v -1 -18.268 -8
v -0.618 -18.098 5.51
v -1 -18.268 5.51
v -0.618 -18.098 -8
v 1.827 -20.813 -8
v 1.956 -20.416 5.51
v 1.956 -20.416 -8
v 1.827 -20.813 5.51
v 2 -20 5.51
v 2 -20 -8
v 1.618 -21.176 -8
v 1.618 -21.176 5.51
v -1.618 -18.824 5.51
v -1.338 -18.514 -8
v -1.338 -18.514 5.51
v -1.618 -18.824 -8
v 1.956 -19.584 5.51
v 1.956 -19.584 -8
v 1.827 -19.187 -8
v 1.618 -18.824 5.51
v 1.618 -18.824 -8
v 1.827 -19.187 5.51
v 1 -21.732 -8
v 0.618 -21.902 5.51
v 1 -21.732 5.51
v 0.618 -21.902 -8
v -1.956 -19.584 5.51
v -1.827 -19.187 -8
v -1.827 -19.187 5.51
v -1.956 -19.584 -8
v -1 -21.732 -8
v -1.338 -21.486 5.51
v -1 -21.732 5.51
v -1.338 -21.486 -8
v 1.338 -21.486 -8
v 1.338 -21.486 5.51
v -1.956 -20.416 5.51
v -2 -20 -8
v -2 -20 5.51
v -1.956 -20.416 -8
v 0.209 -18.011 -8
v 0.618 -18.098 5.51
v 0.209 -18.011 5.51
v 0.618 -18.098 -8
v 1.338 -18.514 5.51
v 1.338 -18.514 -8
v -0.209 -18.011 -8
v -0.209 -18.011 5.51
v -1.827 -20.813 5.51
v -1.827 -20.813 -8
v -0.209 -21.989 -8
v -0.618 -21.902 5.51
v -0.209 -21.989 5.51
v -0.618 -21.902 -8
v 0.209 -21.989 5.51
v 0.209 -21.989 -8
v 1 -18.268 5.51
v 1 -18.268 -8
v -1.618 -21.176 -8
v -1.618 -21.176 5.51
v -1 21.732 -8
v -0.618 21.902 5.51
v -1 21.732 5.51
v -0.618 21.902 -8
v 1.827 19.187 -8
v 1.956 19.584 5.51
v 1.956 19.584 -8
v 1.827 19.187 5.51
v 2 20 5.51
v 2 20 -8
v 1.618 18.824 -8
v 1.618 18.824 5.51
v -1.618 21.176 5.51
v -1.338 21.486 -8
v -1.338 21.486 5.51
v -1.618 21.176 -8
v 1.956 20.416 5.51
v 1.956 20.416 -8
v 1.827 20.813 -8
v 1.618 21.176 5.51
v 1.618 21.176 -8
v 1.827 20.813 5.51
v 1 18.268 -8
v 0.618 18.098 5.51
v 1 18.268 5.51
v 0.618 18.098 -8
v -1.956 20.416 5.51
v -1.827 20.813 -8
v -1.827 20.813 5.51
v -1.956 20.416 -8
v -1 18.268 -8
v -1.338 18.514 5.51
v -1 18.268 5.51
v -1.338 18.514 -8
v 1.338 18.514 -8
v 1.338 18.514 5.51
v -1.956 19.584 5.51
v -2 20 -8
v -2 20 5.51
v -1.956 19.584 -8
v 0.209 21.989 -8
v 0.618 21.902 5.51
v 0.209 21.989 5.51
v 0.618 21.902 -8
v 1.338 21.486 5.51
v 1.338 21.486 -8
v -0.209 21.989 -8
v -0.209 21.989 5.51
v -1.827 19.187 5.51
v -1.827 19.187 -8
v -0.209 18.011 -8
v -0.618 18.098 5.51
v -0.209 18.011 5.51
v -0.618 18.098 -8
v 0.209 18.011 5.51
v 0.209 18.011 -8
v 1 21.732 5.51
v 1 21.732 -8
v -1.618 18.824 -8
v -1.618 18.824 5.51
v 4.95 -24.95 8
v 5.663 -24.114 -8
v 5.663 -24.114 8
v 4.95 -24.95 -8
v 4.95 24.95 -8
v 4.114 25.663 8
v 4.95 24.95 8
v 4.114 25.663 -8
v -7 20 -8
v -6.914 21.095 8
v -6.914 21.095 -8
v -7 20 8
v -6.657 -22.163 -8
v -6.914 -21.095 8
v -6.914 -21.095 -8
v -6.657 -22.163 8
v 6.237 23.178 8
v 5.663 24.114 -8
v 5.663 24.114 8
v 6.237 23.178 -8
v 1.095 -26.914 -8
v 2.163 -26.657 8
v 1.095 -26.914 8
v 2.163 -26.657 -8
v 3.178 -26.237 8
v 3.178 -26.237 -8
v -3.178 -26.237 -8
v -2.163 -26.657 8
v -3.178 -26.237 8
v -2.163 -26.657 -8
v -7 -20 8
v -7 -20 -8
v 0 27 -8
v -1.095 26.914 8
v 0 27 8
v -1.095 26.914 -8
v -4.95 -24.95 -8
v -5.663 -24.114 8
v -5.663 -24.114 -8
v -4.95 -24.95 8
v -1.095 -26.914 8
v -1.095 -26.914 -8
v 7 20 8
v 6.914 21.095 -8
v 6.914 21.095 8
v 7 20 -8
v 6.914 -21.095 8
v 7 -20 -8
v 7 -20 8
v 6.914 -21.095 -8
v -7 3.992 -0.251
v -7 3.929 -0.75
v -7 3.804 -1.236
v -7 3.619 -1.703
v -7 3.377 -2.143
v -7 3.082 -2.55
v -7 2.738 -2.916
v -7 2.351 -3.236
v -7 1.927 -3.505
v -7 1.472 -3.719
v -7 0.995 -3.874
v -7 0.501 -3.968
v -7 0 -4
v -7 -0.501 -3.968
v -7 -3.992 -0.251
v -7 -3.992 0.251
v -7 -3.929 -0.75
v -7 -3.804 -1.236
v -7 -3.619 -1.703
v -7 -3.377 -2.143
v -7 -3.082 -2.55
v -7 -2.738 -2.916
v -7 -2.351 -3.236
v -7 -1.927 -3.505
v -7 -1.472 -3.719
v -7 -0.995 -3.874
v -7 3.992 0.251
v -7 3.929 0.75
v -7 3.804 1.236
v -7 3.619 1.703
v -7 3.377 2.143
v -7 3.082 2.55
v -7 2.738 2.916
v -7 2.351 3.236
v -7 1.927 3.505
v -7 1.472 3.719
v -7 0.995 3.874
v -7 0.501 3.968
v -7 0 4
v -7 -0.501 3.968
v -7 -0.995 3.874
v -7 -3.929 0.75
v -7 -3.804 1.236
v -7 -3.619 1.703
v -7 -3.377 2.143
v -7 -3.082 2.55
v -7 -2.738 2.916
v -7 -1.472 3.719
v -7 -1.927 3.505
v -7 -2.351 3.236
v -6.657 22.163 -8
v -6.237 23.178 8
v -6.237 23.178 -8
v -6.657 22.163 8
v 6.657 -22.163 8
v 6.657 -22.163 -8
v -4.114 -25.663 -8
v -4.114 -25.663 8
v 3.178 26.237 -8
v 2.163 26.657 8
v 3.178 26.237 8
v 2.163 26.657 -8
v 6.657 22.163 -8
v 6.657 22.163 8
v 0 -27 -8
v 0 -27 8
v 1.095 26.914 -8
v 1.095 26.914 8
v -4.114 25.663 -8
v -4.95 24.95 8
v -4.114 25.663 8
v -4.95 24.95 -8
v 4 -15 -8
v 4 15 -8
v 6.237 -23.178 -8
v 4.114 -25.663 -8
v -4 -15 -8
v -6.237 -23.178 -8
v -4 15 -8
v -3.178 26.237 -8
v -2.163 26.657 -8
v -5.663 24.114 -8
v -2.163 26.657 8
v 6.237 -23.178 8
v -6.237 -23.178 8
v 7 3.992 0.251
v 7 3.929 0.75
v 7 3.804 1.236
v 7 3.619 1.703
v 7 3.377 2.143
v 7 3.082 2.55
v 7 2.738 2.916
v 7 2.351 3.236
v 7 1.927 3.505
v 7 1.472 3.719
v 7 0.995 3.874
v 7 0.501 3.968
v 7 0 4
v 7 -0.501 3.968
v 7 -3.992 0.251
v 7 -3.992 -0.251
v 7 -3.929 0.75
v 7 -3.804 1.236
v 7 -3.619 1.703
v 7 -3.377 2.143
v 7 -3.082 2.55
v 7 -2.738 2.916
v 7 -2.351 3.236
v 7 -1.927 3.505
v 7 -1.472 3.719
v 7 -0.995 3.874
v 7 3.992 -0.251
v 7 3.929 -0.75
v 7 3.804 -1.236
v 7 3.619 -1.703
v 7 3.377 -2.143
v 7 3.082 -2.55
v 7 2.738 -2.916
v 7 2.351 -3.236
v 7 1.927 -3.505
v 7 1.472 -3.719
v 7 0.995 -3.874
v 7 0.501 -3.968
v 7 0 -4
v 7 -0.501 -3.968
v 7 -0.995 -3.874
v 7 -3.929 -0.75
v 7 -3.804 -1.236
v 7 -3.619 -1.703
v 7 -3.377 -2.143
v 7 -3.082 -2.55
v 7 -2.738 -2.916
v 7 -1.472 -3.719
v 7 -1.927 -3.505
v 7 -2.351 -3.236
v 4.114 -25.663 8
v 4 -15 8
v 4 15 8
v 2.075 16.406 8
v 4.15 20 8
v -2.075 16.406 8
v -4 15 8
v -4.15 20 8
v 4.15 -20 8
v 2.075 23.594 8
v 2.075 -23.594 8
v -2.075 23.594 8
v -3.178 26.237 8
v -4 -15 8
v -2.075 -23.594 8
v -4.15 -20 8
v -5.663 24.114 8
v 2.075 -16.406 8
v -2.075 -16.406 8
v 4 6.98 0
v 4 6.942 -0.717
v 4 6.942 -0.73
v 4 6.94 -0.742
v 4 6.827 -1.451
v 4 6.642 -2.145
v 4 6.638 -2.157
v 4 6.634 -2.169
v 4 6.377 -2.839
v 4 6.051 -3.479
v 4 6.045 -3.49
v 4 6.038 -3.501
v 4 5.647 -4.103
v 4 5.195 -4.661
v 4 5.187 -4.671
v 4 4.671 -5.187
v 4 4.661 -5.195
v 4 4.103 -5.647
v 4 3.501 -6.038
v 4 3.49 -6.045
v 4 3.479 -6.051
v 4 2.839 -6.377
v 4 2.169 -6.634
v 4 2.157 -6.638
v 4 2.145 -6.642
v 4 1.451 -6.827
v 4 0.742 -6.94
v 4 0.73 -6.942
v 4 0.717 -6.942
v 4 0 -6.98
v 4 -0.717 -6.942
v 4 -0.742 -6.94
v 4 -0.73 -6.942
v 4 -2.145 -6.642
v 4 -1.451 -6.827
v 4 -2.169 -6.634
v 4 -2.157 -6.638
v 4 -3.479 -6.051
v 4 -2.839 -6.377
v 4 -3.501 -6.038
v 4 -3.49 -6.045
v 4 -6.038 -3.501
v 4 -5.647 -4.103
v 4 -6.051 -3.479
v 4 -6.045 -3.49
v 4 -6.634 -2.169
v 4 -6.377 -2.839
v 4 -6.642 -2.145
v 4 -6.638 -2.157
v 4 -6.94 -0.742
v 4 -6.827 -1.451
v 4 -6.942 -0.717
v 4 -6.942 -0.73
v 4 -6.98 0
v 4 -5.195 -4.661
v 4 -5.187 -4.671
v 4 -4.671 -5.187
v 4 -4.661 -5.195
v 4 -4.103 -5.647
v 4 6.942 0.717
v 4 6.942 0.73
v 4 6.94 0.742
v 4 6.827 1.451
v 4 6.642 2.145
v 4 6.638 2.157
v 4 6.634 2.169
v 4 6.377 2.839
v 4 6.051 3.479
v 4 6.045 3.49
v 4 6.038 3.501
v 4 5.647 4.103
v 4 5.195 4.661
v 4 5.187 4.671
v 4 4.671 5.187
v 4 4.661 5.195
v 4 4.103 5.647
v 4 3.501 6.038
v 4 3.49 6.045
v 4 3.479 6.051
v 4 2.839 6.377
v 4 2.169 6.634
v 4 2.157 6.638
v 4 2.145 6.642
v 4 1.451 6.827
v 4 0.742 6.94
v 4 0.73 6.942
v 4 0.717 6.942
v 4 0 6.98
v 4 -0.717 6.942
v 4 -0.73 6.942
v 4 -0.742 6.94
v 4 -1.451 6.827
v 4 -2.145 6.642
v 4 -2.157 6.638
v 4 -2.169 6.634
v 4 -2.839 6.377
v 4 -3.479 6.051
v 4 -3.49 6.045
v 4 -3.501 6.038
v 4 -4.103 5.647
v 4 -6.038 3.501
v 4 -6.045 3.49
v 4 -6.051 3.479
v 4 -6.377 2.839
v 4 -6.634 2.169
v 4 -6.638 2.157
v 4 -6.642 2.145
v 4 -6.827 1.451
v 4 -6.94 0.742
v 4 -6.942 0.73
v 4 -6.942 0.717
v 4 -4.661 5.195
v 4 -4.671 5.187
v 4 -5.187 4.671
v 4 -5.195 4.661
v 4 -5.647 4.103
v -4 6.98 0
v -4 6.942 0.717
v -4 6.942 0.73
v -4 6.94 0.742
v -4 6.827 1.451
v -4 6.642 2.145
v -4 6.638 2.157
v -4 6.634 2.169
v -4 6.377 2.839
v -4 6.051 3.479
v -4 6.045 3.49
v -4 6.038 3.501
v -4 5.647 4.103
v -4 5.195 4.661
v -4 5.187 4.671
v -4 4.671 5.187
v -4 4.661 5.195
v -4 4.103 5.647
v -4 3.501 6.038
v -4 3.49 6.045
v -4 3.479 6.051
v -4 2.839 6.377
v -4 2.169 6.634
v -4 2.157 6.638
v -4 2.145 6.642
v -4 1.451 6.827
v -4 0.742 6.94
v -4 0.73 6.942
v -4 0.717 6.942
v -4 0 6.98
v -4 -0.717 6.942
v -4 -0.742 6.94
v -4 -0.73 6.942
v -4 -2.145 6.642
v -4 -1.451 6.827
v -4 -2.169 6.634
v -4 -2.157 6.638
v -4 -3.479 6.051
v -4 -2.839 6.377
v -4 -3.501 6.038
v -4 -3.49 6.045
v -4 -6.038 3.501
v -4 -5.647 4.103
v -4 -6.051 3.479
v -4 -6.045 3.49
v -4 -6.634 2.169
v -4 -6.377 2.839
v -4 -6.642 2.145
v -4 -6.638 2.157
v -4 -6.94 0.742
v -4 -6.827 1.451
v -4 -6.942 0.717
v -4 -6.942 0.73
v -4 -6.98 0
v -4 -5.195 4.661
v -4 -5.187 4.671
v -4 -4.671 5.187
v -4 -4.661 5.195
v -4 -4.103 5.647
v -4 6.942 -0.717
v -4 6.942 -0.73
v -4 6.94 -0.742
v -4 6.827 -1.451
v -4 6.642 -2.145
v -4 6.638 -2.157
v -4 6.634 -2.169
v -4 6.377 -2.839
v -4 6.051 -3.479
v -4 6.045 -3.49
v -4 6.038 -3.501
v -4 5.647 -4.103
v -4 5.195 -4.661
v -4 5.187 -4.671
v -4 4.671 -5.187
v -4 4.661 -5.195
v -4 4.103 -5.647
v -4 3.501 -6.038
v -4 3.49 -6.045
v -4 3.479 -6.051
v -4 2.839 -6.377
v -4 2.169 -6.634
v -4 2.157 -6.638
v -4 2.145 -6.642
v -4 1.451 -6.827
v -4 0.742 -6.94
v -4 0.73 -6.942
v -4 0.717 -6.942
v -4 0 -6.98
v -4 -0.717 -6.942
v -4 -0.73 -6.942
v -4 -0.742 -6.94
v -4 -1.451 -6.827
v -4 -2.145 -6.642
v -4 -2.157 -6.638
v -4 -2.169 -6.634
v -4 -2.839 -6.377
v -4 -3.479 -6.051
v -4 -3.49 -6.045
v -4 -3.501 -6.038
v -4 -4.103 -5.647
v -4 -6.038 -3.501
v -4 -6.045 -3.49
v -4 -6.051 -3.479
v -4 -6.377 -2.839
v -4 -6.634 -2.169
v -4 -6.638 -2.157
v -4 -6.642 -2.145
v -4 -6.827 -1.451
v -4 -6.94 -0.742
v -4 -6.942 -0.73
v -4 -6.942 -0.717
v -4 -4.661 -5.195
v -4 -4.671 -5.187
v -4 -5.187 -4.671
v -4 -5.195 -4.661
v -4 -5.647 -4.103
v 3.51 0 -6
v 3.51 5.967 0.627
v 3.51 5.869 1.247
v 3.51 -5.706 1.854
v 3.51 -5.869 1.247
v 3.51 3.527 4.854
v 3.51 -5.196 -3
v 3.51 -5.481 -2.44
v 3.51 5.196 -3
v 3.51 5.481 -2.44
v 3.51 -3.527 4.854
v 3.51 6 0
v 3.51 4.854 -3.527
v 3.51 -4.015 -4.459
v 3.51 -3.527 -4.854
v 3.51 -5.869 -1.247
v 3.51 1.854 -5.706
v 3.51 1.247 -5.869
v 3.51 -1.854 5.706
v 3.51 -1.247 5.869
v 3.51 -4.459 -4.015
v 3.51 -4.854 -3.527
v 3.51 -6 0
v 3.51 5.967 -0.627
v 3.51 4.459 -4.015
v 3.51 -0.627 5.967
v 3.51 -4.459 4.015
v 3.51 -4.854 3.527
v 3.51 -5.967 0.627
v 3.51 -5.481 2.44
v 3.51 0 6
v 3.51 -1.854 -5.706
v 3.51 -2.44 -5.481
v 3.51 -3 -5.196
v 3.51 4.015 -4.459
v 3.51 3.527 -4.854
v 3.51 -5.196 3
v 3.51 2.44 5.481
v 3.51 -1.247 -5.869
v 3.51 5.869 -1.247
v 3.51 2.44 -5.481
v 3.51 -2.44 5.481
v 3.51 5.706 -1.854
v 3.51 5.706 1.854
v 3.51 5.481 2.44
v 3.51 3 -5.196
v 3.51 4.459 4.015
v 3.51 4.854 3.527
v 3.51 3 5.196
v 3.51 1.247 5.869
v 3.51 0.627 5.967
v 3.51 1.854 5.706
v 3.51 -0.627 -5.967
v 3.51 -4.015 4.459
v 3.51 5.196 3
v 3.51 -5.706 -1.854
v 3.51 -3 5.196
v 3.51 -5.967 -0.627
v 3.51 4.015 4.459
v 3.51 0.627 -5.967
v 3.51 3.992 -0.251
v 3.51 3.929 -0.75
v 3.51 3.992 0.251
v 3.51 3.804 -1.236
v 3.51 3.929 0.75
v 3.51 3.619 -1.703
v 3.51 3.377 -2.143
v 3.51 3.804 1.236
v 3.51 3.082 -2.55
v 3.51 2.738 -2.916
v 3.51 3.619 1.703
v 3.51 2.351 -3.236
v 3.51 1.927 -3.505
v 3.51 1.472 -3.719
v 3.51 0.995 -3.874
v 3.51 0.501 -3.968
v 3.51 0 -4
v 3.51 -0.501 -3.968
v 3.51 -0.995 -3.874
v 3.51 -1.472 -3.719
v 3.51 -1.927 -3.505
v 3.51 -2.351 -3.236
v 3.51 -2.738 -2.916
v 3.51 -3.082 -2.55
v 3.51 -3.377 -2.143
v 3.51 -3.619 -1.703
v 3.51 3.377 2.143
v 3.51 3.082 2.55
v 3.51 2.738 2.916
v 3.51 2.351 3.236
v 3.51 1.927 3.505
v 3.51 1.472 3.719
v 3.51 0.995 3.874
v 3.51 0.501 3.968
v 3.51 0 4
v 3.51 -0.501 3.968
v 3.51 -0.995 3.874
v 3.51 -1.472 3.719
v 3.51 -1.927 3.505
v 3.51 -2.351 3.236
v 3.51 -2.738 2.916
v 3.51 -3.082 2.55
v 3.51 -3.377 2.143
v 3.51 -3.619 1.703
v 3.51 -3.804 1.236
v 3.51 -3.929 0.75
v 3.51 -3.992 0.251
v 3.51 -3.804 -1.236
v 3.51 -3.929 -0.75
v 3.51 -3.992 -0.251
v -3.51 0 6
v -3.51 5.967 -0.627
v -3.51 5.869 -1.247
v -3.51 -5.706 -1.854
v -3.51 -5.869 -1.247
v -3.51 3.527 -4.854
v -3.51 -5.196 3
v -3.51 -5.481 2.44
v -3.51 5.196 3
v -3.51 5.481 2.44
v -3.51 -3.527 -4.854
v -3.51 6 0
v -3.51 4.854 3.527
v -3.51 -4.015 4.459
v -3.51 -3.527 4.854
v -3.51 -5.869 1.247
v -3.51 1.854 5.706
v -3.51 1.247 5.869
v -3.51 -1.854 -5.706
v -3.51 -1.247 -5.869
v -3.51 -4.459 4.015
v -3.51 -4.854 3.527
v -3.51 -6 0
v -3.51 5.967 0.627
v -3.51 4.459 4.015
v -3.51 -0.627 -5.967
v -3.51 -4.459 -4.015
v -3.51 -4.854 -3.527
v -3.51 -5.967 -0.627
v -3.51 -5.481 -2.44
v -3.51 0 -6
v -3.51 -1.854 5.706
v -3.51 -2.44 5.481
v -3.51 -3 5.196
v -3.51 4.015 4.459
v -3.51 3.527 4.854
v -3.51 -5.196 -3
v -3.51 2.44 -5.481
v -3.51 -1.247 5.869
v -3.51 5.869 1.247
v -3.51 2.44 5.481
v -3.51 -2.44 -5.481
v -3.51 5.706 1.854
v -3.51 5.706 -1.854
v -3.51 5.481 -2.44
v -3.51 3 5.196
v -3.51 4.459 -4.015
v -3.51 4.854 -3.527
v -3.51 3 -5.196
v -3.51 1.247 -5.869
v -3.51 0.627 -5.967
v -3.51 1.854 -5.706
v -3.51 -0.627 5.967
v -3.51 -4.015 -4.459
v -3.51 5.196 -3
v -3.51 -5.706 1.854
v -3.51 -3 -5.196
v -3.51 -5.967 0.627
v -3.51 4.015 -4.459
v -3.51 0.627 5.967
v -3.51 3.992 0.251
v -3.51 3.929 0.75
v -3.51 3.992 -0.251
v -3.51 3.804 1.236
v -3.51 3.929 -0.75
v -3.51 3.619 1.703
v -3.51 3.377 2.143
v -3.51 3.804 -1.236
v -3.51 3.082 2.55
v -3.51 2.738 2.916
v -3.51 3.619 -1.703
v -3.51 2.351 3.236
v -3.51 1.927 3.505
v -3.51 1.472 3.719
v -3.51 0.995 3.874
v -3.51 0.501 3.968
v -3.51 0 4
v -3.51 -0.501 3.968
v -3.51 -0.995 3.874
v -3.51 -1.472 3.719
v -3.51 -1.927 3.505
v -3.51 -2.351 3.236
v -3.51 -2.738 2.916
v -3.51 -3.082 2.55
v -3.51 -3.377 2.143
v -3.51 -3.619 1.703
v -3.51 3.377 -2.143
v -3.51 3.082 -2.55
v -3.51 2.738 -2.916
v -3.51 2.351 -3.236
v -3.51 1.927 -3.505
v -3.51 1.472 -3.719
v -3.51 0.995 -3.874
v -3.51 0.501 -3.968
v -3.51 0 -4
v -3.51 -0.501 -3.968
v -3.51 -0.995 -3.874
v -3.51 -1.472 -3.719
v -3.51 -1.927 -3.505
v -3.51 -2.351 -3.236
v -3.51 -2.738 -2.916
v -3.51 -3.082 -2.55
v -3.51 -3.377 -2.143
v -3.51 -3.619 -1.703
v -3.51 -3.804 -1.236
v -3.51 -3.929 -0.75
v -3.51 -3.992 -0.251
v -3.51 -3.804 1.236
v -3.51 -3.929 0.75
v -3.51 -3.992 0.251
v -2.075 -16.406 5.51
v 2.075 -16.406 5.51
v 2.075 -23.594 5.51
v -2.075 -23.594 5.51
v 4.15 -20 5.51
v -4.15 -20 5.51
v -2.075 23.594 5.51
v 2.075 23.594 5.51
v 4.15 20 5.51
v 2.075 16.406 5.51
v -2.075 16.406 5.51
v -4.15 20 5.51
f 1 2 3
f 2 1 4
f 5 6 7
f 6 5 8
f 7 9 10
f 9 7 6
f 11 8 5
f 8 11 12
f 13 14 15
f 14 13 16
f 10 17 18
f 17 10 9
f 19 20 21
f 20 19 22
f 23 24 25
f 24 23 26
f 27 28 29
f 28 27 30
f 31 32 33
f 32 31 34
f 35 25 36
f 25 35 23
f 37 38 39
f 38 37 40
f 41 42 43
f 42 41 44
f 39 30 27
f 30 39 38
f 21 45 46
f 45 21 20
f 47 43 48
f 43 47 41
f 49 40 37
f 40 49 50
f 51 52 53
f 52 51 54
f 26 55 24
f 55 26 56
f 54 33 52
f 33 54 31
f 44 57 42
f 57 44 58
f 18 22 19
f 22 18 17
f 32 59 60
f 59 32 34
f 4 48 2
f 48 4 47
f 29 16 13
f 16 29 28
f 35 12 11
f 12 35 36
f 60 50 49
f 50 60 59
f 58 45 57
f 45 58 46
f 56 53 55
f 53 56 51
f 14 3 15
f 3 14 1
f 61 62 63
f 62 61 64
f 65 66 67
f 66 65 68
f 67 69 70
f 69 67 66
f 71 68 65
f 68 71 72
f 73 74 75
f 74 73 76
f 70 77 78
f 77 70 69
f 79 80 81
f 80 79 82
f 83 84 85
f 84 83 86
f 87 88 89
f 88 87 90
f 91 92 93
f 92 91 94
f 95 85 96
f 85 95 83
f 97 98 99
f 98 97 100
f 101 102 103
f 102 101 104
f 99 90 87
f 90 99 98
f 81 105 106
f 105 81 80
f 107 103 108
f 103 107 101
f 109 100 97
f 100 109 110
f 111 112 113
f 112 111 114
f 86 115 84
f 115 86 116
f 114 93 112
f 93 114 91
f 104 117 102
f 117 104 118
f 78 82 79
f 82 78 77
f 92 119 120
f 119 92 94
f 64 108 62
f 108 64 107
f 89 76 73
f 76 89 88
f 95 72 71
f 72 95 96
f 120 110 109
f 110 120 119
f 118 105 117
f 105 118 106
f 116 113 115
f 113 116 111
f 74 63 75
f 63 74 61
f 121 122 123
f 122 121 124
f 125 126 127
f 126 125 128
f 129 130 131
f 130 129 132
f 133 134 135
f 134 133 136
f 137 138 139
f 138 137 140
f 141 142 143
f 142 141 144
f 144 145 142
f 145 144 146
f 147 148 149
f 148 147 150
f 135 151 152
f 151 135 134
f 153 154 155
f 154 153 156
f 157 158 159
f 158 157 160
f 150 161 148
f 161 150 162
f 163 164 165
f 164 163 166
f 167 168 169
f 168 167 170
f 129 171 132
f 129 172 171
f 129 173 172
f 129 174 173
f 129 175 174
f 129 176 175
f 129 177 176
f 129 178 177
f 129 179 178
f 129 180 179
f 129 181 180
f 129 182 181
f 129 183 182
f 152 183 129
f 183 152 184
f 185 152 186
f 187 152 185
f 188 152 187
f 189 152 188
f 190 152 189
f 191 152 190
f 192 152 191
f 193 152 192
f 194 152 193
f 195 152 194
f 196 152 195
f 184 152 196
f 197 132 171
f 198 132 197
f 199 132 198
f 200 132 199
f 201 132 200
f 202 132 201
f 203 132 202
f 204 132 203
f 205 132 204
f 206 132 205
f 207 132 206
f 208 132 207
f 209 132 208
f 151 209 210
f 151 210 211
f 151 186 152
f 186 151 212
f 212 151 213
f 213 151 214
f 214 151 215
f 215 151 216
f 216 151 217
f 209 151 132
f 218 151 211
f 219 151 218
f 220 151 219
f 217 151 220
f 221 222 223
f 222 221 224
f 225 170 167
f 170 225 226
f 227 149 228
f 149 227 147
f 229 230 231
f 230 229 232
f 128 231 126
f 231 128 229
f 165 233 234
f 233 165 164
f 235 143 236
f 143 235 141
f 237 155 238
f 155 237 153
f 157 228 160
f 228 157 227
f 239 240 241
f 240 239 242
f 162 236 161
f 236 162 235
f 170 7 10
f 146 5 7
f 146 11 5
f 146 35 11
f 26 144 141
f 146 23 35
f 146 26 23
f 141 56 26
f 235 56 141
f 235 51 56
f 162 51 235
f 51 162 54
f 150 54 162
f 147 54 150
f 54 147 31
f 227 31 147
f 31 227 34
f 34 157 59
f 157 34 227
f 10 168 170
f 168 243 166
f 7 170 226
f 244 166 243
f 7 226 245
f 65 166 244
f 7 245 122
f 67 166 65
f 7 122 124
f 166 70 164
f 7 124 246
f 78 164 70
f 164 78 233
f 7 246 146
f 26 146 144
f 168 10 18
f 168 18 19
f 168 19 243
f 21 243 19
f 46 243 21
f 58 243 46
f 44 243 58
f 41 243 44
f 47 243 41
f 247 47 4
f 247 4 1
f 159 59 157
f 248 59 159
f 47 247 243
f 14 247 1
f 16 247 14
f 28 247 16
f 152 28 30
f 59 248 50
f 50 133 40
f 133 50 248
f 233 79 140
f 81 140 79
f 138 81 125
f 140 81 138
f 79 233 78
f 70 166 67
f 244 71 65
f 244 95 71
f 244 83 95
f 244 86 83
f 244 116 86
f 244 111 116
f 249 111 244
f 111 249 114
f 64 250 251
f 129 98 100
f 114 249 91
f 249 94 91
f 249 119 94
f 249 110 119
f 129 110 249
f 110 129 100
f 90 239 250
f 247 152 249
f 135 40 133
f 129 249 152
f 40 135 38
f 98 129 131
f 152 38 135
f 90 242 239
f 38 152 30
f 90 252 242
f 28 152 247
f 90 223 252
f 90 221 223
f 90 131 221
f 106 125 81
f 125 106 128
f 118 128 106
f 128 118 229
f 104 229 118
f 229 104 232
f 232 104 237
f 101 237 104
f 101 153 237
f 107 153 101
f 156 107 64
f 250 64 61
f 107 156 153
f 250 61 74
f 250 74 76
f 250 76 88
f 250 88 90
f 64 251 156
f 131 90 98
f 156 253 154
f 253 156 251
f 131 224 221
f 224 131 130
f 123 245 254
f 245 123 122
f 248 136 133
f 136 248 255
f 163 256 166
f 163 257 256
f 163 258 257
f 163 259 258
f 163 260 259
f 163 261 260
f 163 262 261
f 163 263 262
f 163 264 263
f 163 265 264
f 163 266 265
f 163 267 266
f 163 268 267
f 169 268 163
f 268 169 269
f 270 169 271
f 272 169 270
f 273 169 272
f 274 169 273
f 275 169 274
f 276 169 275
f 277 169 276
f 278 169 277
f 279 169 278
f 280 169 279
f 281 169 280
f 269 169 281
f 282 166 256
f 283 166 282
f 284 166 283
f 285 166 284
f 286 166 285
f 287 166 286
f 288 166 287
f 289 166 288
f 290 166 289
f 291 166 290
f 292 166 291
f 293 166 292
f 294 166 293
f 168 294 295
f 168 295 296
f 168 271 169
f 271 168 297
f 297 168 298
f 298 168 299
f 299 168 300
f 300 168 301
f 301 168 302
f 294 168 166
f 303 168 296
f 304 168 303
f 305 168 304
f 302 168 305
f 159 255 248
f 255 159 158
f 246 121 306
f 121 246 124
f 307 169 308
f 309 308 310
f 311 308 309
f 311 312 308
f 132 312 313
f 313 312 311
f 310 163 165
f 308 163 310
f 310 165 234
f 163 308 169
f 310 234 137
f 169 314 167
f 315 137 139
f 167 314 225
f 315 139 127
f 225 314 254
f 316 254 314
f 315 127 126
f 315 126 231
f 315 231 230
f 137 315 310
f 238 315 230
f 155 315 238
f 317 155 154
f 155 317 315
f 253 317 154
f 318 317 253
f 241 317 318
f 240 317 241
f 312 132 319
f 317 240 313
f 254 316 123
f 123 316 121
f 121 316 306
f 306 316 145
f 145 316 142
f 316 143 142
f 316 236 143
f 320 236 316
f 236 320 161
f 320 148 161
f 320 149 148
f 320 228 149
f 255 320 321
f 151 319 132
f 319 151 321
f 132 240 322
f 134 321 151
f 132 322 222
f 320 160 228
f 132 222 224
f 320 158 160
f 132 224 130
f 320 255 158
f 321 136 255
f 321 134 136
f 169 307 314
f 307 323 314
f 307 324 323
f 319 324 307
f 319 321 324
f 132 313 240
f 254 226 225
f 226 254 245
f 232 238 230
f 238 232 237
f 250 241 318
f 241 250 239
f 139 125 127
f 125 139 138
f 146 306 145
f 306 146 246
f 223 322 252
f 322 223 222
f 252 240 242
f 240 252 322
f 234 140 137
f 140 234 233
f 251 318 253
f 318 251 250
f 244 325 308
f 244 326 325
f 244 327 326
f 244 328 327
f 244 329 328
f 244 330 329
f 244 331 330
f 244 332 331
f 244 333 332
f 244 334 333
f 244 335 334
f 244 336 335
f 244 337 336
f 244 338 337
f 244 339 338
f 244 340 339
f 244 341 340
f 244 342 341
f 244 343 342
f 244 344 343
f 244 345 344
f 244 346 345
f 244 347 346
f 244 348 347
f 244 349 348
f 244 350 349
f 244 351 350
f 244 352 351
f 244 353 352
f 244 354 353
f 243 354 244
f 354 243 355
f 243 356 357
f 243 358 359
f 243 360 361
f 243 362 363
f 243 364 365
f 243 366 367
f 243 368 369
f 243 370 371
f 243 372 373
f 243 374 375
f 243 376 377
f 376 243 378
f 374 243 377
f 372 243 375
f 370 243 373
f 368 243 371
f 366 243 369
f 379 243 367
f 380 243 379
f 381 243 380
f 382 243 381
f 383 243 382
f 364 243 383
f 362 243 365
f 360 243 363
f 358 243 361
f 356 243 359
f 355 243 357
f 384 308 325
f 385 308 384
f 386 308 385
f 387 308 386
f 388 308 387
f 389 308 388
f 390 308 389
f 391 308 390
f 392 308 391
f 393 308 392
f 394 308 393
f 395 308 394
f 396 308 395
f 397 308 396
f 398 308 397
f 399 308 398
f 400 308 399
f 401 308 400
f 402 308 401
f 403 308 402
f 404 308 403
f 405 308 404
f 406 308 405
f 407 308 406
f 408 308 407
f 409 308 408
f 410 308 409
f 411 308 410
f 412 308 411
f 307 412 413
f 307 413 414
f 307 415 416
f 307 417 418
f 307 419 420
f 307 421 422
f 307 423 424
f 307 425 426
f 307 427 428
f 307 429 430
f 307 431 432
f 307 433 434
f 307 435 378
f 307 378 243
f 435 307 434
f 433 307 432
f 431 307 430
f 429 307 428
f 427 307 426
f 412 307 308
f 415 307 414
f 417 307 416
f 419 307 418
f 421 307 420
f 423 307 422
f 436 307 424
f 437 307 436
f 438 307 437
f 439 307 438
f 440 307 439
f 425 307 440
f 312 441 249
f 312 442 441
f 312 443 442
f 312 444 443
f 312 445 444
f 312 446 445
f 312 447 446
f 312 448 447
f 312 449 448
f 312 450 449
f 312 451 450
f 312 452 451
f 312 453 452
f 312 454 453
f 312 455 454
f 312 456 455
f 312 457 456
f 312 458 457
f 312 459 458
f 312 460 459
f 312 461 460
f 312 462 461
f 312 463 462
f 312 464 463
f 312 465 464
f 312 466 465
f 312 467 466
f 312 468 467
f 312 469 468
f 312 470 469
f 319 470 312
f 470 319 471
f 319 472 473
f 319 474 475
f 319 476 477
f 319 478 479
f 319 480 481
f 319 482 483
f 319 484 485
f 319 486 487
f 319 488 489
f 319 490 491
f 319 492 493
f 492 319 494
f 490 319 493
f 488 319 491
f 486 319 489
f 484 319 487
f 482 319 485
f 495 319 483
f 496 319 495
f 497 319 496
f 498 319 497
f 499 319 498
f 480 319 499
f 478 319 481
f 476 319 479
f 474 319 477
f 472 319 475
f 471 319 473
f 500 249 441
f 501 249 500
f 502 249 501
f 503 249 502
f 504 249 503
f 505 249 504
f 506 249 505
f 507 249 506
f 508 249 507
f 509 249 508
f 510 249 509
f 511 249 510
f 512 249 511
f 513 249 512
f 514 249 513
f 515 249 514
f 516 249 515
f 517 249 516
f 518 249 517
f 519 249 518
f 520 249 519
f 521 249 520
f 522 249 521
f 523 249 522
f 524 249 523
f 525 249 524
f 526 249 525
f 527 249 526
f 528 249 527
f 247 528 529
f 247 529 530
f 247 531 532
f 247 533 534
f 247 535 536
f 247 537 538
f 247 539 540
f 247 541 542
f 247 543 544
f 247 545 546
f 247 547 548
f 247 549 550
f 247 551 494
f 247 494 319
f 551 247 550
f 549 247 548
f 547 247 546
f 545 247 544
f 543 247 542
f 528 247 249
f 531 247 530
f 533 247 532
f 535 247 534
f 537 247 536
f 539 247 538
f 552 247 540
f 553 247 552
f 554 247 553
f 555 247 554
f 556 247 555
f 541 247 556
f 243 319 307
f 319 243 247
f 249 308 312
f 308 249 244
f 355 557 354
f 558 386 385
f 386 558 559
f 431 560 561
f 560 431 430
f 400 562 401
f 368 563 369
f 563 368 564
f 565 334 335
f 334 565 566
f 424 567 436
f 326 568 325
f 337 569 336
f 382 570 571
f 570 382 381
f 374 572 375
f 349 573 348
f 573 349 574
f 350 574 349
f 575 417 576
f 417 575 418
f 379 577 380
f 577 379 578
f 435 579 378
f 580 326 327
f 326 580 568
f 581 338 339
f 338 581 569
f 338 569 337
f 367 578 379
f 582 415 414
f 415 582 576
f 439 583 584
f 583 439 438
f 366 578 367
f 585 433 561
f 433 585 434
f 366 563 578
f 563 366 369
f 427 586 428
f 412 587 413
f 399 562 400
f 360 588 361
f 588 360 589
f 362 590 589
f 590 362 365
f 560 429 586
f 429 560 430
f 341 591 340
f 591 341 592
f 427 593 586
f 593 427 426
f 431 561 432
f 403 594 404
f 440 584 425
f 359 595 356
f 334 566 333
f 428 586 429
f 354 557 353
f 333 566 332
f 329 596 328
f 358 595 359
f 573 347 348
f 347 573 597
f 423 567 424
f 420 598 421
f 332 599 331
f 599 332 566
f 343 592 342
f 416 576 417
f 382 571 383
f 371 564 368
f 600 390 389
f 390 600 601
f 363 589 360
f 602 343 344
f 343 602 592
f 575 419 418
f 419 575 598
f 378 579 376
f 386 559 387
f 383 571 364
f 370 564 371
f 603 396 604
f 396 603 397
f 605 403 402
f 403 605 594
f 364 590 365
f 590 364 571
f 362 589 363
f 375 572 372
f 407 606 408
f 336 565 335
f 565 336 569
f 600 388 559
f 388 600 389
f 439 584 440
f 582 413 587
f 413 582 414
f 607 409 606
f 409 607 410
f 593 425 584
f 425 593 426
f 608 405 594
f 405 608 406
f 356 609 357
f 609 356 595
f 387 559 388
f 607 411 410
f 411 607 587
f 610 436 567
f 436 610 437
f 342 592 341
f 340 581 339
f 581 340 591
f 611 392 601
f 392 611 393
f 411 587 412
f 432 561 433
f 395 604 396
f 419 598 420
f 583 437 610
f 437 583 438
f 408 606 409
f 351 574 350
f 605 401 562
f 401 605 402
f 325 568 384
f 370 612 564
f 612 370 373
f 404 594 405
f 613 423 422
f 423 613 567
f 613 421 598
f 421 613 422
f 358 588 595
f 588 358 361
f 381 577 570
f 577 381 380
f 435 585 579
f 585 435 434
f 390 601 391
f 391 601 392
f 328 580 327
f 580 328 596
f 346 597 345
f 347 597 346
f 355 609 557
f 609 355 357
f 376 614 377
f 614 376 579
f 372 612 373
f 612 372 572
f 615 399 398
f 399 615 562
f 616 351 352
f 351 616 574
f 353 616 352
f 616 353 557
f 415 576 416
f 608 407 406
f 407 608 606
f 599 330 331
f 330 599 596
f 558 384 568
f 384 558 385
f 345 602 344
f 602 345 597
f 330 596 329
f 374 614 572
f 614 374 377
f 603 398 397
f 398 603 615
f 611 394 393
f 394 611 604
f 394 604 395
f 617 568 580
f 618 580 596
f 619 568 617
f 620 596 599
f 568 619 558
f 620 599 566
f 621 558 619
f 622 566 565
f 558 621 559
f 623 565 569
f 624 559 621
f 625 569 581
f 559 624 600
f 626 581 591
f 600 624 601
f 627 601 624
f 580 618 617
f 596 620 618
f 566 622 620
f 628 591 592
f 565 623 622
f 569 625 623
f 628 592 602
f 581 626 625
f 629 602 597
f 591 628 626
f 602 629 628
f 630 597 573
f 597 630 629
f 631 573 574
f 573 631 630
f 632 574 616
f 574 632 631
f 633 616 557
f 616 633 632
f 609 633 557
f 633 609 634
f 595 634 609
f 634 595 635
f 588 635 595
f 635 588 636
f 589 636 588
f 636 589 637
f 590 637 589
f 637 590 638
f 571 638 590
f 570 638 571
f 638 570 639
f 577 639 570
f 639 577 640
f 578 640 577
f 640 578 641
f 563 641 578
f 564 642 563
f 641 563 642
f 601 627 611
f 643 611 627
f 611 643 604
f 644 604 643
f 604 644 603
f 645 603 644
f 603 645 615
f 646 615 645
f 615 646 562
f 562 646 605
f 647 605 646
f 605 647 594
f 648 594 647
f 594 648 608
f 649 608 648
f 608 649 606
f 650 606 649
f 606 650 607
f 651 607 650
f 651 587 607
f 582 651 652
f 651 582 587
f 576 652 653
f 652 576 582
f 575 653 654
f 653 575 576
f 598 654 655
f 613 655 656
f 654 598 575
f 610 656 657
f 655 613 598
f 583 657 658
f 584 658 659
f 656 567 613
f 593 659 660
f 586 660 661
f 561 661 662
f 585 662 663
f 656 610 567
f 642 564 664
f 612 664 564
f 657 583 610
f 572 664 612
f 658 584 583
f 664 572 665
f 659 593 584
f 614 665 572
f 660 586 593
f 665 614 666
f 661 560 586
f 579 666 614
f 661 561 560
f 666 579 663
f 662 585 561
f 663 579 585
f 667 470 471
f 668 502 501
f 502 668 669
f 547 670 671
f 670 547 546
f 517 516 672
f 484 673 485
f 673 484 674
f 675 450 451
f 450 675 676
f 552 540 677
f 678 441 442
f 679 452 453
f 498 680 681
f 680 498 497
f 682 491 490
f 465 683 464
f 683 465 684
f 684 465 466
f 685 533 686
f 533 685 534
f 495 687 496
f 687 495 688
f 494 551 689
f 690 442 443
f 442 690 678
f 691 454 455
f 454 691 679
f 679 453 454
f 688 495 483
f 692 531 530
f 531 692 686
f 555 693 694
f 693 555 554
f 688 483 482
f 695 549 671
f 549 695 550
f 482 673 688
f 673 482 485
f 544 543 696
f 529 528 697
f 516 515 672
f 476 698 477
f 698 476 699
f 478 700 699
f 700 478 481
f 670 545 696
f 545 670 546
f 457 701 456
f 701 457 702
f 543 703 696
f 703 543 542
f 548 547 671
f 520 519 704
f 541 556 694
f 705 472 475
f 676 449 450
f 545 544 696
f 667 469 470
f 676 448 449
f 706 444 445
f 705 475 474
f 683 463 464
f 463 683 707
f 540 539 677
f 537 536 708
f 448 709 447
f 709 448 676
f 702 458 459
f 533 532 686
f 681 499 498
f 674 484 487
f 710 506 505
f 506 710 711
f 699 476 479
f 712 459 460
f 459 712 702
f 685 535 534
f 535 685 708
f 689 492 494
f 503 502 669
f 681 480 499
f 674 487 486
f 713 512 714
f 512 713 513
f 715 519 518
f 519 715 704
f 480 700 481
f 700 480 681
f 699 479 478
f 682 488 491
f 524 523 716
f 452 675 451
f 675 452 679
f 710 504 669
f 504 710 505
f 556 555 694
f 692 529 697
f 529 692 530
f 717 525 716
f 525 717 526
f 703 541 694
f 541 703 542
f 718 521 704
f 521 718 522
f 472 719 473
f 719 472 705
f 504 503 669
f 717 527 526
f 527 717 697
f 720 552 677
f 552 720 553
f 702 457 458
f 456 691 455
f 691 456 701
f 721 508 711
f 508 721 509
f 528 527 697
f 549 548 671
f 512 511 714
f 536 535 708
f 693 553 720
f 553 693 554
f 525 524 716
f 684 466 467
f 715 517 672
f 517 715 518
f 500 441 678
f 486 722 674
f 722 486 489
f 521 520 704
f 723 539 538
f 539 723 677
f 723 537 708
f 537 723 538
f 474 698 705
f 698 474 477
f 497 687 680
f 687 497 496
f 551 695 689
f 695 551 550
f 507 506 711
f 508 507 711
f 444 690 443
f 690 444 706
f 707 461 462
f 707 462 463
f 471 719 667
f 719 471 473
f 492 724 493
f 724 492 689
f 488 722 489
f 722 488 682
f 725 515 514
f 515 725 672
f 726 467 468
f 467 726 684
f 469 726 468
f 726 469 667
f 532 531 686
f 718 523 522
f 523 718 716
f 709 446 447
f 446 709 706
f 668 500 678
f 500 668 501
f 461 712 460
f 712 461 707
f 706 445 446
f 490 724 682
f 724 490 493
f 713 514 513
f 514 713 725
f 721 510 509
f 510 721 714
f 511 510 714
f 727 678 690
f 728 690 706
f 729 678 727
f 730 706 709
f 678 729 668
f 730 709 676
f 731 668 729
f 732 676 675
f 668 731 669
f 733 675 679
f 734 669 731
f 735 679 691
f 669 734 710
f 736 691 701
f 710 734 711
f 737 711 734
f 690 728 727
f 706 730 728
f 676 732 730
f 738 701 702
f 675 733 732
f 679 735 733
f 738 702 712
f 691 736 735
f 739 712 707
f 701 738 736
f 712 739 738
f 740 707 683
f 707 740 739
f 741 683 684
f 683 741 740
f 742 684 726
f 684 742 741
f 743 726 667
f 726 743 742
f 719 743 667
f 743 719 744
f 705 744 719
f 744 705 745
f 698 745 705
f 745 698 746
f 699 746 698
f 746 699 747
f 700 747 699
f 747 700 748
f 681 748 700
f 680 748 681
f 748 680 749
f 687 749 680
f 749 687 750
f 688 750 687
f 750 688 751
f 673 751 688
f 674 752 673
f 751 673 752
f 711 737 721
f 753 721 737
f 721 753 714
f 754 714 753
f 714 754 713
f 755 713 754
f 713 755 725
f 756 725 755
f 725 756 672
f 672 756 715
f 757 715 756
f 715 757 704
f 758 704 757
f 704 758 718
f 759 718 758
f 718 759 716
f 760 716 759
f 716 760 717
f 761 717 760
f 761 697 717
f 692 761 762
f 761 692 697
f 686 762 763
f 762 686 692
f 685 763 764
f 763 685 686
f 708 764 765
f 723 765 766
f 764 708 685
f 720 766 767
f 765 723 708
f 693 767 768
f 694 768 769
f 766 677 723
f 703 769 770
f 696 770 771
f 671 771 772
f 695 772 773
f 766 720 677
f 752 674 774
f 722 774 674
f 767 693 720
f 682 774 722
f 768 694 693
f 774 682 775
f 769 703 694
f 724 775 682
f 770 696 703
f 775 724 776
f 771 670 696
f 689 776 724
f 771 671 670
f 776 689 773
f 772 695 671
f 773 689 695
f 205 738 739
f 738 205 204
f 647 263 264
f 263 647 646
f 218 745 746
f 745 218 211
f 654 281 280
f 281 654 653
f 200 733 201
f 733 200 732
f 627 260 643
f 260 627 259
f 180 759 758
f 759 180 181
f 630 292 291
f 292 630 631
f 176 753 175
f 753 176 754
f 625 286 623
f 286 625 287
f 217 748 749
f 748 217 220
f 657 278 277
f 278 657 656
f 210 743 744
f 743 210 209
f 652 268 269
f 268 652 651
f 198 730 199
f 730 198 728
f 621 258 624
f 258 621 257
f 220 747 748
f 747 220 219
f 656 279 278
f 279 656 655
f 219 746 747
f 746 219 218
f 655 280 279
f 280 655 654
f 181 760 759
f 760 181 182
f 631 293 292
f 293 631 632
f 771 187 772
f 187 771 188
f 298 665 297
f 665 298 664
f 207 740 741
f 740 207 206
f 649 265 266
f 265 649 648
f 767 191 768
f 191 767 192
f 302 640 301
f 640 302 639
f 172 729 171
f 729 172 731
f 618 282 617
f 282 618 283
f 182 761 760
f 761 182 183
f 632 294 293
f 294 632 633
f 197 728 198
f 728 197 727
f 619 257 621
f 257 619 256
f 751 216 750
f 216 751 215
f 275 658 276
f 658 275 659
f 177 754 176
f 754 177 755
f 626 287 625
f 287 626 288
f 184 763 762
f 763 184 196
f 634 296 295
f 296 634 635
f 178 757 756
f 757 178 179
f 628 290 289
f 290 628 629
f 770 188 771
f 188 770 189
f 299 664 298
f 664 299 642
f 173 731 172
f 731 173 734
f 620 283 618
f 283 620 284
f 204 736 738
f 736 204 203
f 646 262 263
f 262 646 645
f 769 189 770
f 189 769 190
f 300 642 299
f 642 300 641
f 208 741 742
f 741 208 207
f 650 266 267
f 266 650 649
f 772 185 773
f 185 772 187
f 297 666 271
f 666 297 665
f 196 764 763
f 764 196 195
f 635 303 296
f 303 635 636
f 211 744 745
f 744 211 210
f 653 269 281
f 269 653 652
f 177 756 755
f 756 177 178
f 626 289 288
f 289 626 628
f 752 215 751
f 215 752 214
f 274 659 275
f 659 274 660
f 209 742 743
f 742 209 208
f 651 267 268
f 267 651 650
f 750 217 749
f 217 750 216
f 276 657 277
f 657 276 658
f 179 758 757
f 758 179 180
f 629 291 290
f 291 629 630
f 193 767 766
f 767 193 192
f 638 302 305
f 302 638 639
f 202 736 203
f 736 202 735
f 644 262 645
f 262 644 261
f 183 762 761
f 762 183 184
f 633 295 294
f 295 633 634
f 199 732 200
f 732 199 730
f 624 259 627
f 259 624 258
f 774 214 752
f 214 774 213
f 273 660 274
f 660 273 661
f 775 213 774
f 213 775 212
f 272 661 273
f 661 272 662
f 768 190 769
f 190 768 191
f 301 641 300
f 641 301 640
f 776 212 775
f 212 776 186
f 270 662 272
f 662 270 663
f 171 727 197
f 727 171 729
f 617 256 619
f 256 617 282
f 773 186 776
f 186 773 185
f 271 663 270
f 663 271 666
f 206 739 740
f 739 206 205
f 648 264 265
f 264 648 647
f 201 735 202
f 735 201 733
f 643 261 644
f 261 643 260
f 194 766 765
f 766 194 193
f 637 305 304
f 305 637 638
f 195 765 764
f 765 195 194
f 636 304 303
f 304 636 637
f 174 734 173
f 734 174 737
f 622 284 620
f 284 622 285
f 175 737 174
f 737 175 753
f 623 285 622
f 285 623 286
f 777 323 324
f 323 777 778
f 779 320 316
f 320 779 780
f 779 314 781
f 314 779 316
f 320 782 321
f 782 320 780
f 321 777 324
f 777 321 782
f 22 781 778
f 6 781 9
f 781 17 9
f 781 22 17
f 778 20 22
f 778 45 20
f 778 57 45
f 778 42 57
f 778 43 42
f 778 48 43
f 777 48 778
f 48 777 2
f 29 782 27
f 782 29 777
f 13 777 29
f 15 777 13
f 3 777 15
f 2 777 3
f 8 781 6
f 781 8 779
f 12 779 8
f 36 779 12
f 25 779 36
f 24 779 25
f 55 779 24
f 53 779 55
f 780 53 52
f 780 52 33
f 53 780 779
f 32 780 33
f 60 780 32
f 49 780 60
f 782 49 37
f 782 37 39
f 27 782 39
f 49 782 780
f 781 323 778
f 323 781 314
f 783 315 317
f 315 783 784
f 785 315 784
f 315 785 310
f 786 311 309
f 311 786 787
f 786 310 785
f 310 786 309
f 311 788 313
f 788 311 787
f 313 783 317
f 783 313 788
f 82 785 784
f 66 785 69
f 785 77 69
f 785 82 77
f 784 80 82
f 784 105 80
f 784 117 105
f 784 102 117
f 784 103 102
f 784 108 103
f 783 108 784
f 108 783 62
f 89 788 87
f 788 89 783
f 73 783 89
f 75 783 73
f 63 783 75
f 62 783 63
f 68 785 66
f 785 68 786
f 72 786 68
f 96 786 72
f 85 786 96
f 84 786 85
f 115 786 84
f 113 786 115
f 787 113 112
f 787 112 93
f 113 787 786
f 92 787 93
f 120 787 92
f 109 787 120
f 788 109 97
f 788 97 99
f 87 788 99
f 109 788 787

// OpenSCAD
// file: configuration.scad
// OD = outside diameter, corner to corner.
m3_nut_od = 6.1;
m3_nut_radius = (m3_nut_od+0.2)/2;

m4_nut_od = 8.1;
m4_nut_radius = (m4_nut_od+0.2)/2;

// Major diameter of metric 3mm thread.
m3_major = 2.85;
m3_radius = m3_major/2;
m3_open_radius = 3.2/2;

m4_major = 3.85;
m4_radius = m4_major/2;
m4_open_radius = 4.3/2;

m8_major = 7.85;
m8_radius = m8_major/2;
m8_open_radius = 8.3/2;

// NEMA17 stepper motors.
motor_shaft_diameter = 5;
motor_shaft_radius = (motor_shaft_diameter+0.3)/2;

// Frame brackets.
thickness = 3.6;

tower_radius = 185;
tower_side = tower_radius*1.73205;
tower_h = tower_radius*1.5;
tower_height = 1000;
bearing_spacing = 39.8;
horizontal_beam_radius = (tower_radius+28.8)/2;
horizontal_beam_length = horizontal_beam_radius * 3.464101615138 - (41.35*2);

color_a = "GreenYellow";
color_b = "black";
color_c = "";
color_d = "Silver";
// file: ../components/bearing_608.scad
module bearing_608(){
	color("LightGrey") difference(){
		hull(){
			cylinder(6,11,11,$fn=80,center=true);
			cylinder(7,10.5,10.5,$fn=80,center=true);
		}
		translate([0,0,-0.5]) cylinder(10,9,9,$fn=80,center=true);
	}
	color("LightGrey") 
		difference(){
			cylinder(7,6,6,$fn=80,center=true);
			cylinder(10,4,4,$fn=80,center=true);
		}
	color("DarkGray") 
		difference(){
			cylinder(6.6,10.6,10.6,$fn=80,center=true);
			cylinder(10,5,5,$fn=80,center=true);
		}
}
// file: ../components/M4x60_hex.scad
module m4x60_hex(){
	color("LightGrey") 
		difference(){
			cylinder(4,3.5,3.5,$fn=40);
			translate([0,0,1.1])cylinder(3,1.6,1.6,$fn=6);
		}
	color("LightGrey") translate([0,0,-40]) cylinder(40,2,2,$fn=30);
	color("Gray") translate([0,0,-60]) cylinder(20,1.9,1.9,$fn=30);
}
// file: ../components/2020.scad
module outer_shape(h=10){
	hull(){
		translate([8.6,8.6,-h/2]) cylinder(r=1.4,h=h,$fn=30);
		translate([8.6,-8.6,-h/2]) cylinder(r=1.4,h=h,$fn=30);
		translate([-8.6,8.6,-h/2]) cylinder(r=1.4,h=h,$fn=30);
		translate([-8.6,-8.6,-h/2]) cylinder(r=1.4,h=h,$fn=30);
	}
}

module extrusion(h=10){
	difference(){
		union(){
			difference(){
				outer_shape(h=h);
				cube([17.2,17.2,h+0.1],center=true);
				cube([20.1,6,h+0.1],center=true);
				cube([6,20.1,h+0.1],center=true);

				translate([-9.9,0,0])cube([0.5,6.8,h+0.1],center=true);
				translate([9.9,0,0])cube([0.5,6.8,h+0.1],center=true);
				translate([0,-9.9,0])cube([6.8,0.5,h+0.1],center=true);
				translate([0,9.9,0])cube([6.8,0.5,h+0.1],center=true);
			}
			rotate([0,0,45]) cube([26,1.5,h],center=true);
			rotate([0,0,-45]) cube([26,1.5,h],center=true);
			intersection(){
				union(){
					translate([8,8,0]) cube([4,4,h],center=true);
					translate([8,-8,0]) cube([4,4,h],center=true);
					translate([-8,8,0]) cube([4,4,h],center=true);
					translate([-8,-8,0]) cube([4,4,h],center=true);
				}
				outer_shape();
			}
			cube([9,9,h],center=true);
		}
		translate([0,0,-h/2-1]) cylinder(h+2,2.5,2.5,$fn=30);
	}


}

module beam(h=10,clearance = 0){
	if(clearance > 0){
		outer_shape(h=h);
	} else {
		extrusion(h);
	}
}
// main file
include <../components/2020.scad>
include <../components/M4x60_hex.scad>
include <../components/bearing_608.scad>
include <configuration.scad>

screw_spacing = 40;
bearing_holder_height = 16;
bearing_holder_width = 30;
bearing_holder_depth = 8;

module tensioner_mount(){
	difference(){
		hull(){
			translate([0,0,2])cube([bearing_holder_depth+6,screw_spacing,24],center=true);
			translate([0,(screw_spacing/2),-10]) cylinder(r=7,h=24,$fn=40);
			translate([0,-(screw_spacing/2),-10]) cylinder(r=7,h=24,$fn=40);
		}
		// Screw Cutouts
		translate([0,(screw_spacing/2),14.01]) m4x60_hex();
		translate([0,-(screw_spacing/2),14.01]) m4x60_hex();

		translate([0,0,14.01]) cylinder(r=m4_open_radius,h=100,$fn=50, center=true);

		// Beam Cutout
		rotate([0,90,0]) beam(h=100,clearance=1);
		translate([0,0,-2]) rotate([0,90,0]) beam(h=100,clearance=1);
	}
}

module tensioner_bearing(){
	difference(){
		union(){
			difference(){
				hull(){
					cube([bearing_holder_depth+6,screw_spacing,bearing_holder_height],center=true);
					translate([0,(screw_spacing/2),0]) cylinder(r=7,h=bearing_holder_height,$fn=40,center=true);
					translate([0,-(screw_spacing/2),0]) cylinder(r=7,h=bearing_holder_height,$fn=40,center=true);
				}
				// Screw Cutouts
				translate([0,(screw_spacing/2),14.01]) m4x60_hex();
				translate([0,-(screw_spacing/2),14.01]) m4x60_hex();

				// B	earing Cutout
				translate([0,0,0])cube([bearing_holder_depth,bearing_holder_width,30],center=true);
			}
			translate([(bearing_holder_depth/2+0.01),0,0]) rotate([0,-90,0]) cylinder(0.5,7,6,$fn=60);
			translate([-(bearing_holder_depth/2+0.01),0,0]) rotate([0,90,0]) cylinder(0.5,7,6,$fn=60);
		}
		rotate([0,90,0]) cylinder(r=4,h=bearing_holder_depth+10,$fn=50,center=true);
		translate([0,(screw_spacing/2),-(bearing_holder_height/2)-0.01]) cylinder(r=m4_nut_radius,h=2.5,$fn=6);
		translate([0,-(screw_spacing/2),-(bearing_holder_height/2)-0.01]) cylinder(r=m4_nut_radius,h=2.5,$fn=6);
	}
}

module tensioner(mount_color="Red",bearing_color="Red"){
	color(mount_color) tensioner_mount();
	color(bearing_color) translate([0,0,-35]) tensioner_bearing();
	
	translate([0,(screw_spacing/2),14]) m4x60_hex();
	translate([0,-(screw_spacing/2),14]) m4x60_hex();
	translate([0,0,-35]) rotate([0,90,0]) bearing_608();
}

module tensioner_w_bar(color="Red"){
	tensioner(color=color);
	color("Silver") rotate([0,90,0]) beam(h=100);
}
//tensioner_w_bar();

rotate([180,0,0]) tensioner_bearing();
